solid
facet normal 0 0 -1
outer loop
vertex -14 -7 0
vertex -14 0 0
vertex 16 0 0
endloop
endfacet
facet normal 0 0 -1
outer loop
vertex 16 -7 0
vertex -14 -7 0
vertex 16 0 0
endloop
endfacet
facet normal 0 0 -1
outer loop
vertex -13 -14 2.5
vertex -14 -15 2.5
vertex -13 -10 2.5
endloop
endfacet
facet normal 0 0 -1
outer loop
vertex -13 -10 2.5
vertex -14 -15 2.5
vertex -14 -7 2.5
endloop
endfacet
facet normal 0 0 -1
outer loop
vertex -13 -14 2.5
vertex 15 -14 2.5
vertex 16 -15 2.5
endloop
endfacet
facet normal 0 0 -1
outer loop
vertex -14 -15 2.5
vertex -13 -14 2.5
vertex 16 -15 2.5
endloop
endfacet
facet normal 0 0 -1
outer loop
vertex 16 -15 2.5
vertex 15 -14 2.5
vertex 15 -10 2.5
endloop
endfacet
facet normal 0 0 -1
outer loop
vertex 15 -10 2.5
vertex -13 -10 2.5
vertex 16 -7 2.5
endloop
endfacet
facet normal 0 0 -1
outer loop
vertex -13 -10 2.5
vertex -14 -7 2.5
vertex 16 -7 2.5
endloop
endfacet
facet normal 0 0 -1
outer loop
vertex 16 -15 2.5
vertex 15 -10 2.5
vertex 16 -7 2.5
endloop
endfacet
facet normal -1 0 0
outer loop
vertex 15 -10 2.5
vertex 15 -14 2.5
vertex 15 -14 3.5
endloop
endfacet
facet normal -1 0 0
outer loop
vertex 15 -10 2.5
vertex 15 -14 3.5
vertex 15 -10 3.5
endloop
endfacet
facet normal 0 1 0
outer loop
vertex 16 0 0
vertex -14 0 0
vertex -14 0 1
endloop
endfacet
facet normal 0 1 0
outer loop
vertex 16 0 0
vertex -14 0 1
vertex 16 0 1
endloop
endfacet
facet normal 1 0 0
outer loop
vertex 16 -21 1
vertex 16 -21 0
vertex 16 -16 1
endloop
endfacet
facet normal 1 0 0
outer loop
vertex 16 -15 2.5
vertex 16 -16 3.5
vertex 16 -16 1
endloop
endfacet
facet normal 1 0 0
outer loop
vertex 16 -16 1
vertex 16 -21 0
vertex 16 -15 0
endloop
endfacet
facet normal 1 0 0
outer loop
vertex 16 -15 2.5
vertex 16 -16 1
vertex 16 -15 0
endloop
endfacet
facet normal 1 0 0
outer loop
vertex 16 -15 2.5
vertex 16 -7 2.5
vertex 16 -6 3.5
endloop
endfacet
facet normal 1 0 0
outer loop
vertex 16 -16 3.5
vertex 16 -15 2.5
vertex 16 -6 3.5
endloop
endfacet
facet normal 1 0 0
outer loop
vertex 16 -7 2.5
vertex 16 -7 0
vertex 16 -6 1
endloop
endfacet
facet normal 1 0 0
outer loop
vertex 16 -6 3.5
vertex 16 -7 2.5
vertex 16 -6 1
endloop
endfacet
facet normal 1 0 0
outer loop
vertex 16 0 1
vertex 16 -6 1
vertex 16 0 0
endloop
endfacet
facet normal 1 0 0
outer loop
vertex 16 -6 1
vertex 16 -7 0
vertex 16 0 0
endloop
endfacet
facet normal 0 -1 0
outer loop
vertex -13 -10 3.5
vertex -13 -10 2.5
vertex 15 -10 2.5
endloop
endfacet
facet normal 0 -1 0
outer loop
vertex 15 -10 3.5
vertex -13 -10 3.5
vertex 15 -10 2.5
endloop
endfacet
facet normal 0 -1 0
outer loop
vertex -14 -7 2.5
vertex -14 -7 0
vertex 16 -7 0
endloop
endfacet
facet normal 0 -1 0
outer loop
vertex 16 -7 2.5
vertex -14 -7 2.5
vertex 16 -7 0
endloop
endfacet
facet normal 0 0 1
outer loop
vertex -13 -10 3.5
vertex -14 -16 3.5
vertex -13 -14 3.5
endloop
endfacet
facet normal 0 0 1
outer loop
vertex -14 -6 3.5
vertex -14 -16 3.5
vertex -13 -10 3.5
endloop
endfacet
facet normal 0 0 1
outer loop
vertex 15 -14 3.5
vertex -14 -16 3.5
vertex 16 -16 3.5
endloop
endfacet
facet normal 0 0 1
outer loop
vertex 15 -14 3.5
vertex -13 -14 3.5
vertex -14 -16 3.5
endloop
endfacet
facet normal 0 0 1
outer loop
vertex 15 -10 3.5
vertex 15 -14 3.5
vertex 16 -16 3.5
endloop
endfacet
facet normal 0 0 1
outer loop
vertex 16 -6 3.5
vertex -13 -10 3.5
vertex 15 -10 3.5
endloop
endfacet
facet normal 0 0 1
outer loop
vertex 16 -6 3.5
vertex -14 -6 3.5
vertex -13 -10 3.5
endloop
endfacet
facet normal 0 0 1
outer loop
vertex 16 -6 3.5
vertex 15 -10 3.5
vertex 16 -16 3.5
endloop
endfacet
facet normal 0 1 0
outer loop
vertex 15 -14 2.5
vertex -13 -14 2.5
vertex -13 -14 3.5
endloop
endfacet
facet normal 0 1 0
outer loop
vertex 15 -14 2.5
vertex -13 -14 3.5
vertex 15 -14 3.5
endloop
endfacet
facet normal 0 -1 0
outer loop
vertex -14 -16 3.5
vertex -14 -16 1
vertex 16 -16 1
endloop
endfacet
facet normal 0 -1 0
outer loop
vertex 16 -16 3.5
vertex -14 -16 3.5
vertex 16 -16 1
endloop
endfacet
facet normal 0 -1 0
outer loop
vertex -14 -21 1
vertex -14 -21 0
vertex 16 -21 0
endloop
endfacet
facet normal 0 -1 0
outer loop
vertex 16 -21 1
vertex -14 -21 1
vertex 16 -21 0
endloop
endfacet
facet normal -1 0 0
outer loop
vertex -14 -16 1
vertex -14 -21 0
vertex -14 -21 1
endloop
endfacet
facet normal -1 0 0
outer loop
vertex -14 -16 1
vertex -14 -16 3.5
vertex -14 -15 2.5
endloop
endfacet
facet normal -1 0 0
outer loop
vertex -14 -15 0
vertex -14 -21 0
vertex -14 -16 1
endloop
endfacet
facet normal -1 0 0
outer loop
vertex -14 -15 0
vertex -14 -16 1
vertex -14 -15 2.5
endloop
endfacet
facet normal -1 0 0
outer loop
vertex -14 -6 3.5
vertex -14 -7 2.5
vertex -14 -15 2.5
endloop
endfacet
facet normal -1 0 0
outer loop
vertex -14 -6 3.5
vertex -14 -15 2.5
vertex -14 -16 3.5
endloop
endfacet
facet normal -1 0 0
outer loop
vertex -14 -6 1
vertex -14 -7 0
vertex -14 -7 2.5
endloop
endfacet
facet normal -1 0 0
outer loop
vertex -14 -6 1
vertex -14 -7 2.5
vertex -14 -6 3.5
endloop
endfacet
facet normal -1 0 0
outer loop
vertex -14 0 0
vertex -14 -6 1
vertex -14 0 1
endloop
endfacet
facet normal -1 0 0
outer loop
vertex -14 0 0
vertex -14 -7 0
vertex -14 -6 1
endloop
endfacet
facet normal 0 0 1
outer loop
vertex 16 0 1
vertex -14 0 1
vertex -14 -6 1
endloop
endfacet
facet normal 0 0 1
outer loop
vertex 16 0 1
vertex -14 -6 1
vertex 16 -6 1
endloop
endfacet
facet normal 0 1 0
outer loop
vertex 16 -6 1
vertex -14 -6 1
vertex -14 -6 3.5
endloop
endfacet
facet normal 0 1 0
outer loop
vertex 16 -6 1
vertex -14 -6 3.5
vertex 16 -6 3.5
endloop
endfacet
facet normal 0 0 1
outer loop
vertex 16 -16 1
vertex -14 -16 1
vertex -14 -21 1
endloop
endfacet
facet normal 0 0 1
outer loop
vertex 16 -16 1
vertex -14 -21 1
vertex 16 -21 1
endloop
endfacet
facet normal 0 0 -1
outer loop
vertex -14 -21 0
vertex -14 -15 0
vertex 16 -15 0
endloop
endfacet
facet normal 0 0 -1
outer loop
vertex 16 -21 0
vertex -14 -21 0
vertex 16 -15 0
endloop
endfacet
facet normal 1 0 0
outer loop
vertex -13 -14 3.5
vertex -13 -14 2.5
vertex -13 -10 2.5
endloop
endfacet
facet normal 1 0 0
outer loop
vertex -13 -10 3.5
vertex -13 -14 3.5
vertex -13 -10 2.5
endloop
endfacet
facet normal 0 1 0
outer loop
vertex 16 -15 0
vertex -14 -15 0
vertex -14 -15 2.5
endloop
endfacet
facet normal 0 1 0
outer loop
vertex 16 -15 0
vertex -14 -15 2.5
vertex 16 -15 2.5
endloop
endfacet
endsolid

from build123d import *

# Parameters (mm, degrees)
BOX016_W     = 28
BOX016_H     = 4
BOX016_DEPTH = 10
BOX004_W     = 30
BOX004_H     = 8
BOX004_DEPTH = 2.5
BOX003_W     = 30
BOX003_H     = 10
BOX003_DEPTH = 3.5
BOX002_W     = 30
BOX002_H     = 21
BOX002_DEPTH = 1


with BuildPart() as cubo016:
    # Box016 → Box016 (new body)
    with BuildSketch(Plane(origin=(-13, -14, 0), x_dir=(1, 0, 0), z_dir=(0, 0, 1))):
        with Locations((14, 2)):
            Rectangle(BOX016_W, BOX016_H)
    extrude(amount=BOX016_DEPTH)


with BuildPart() as cubo004:
    # Box004 → Box004 (new body)
    with BuildSketch(Plane(origin=(-14, -15, 0), x_dir=(1, 0, 0), z_dir=(0, 0, 1))):
        with Locations((15, 4)):
            Rectangle(BOX004_W, BOX004_H)
    extrude(amount=BOX004_DEPTH)


with BuildPart() as cubo003:
    # Box003 → Box003 (new body)
    with BuildSketch(Plane(origin=(-14, -16, 0), x_dir=(1, 0, 0), z_dir=(0, 0, 1))):
        with Locations((15, 5)):
            Rectangle(BOX003_W, BOX003_H)
    extrude(amount=BOX003_DEPTH)


with BuildPart() as cut008:
    # Box002 → Box002 (new body)
    with BuildSketch(Plane(origin=(-14, -21, 0), x_dir=(1, 0, 0), z_dir=(0, 0, 1))):
        with Locations((15, 10.5)):
            Rectangle(BOX002_W, BOX002_H)
    extrude(amount=BOX002_DEPTH)

    # Fusion001: union Cubo003
    add(cubo003.part)

    # Cut006: cut Cubo004
    add(cubo004.part, mode=Mode.SUBTRACT)

    # Cut008: cut Cubo016
    add(cubo016.part, mode=Mode.SUBTRACT)


solid = cut008.part
